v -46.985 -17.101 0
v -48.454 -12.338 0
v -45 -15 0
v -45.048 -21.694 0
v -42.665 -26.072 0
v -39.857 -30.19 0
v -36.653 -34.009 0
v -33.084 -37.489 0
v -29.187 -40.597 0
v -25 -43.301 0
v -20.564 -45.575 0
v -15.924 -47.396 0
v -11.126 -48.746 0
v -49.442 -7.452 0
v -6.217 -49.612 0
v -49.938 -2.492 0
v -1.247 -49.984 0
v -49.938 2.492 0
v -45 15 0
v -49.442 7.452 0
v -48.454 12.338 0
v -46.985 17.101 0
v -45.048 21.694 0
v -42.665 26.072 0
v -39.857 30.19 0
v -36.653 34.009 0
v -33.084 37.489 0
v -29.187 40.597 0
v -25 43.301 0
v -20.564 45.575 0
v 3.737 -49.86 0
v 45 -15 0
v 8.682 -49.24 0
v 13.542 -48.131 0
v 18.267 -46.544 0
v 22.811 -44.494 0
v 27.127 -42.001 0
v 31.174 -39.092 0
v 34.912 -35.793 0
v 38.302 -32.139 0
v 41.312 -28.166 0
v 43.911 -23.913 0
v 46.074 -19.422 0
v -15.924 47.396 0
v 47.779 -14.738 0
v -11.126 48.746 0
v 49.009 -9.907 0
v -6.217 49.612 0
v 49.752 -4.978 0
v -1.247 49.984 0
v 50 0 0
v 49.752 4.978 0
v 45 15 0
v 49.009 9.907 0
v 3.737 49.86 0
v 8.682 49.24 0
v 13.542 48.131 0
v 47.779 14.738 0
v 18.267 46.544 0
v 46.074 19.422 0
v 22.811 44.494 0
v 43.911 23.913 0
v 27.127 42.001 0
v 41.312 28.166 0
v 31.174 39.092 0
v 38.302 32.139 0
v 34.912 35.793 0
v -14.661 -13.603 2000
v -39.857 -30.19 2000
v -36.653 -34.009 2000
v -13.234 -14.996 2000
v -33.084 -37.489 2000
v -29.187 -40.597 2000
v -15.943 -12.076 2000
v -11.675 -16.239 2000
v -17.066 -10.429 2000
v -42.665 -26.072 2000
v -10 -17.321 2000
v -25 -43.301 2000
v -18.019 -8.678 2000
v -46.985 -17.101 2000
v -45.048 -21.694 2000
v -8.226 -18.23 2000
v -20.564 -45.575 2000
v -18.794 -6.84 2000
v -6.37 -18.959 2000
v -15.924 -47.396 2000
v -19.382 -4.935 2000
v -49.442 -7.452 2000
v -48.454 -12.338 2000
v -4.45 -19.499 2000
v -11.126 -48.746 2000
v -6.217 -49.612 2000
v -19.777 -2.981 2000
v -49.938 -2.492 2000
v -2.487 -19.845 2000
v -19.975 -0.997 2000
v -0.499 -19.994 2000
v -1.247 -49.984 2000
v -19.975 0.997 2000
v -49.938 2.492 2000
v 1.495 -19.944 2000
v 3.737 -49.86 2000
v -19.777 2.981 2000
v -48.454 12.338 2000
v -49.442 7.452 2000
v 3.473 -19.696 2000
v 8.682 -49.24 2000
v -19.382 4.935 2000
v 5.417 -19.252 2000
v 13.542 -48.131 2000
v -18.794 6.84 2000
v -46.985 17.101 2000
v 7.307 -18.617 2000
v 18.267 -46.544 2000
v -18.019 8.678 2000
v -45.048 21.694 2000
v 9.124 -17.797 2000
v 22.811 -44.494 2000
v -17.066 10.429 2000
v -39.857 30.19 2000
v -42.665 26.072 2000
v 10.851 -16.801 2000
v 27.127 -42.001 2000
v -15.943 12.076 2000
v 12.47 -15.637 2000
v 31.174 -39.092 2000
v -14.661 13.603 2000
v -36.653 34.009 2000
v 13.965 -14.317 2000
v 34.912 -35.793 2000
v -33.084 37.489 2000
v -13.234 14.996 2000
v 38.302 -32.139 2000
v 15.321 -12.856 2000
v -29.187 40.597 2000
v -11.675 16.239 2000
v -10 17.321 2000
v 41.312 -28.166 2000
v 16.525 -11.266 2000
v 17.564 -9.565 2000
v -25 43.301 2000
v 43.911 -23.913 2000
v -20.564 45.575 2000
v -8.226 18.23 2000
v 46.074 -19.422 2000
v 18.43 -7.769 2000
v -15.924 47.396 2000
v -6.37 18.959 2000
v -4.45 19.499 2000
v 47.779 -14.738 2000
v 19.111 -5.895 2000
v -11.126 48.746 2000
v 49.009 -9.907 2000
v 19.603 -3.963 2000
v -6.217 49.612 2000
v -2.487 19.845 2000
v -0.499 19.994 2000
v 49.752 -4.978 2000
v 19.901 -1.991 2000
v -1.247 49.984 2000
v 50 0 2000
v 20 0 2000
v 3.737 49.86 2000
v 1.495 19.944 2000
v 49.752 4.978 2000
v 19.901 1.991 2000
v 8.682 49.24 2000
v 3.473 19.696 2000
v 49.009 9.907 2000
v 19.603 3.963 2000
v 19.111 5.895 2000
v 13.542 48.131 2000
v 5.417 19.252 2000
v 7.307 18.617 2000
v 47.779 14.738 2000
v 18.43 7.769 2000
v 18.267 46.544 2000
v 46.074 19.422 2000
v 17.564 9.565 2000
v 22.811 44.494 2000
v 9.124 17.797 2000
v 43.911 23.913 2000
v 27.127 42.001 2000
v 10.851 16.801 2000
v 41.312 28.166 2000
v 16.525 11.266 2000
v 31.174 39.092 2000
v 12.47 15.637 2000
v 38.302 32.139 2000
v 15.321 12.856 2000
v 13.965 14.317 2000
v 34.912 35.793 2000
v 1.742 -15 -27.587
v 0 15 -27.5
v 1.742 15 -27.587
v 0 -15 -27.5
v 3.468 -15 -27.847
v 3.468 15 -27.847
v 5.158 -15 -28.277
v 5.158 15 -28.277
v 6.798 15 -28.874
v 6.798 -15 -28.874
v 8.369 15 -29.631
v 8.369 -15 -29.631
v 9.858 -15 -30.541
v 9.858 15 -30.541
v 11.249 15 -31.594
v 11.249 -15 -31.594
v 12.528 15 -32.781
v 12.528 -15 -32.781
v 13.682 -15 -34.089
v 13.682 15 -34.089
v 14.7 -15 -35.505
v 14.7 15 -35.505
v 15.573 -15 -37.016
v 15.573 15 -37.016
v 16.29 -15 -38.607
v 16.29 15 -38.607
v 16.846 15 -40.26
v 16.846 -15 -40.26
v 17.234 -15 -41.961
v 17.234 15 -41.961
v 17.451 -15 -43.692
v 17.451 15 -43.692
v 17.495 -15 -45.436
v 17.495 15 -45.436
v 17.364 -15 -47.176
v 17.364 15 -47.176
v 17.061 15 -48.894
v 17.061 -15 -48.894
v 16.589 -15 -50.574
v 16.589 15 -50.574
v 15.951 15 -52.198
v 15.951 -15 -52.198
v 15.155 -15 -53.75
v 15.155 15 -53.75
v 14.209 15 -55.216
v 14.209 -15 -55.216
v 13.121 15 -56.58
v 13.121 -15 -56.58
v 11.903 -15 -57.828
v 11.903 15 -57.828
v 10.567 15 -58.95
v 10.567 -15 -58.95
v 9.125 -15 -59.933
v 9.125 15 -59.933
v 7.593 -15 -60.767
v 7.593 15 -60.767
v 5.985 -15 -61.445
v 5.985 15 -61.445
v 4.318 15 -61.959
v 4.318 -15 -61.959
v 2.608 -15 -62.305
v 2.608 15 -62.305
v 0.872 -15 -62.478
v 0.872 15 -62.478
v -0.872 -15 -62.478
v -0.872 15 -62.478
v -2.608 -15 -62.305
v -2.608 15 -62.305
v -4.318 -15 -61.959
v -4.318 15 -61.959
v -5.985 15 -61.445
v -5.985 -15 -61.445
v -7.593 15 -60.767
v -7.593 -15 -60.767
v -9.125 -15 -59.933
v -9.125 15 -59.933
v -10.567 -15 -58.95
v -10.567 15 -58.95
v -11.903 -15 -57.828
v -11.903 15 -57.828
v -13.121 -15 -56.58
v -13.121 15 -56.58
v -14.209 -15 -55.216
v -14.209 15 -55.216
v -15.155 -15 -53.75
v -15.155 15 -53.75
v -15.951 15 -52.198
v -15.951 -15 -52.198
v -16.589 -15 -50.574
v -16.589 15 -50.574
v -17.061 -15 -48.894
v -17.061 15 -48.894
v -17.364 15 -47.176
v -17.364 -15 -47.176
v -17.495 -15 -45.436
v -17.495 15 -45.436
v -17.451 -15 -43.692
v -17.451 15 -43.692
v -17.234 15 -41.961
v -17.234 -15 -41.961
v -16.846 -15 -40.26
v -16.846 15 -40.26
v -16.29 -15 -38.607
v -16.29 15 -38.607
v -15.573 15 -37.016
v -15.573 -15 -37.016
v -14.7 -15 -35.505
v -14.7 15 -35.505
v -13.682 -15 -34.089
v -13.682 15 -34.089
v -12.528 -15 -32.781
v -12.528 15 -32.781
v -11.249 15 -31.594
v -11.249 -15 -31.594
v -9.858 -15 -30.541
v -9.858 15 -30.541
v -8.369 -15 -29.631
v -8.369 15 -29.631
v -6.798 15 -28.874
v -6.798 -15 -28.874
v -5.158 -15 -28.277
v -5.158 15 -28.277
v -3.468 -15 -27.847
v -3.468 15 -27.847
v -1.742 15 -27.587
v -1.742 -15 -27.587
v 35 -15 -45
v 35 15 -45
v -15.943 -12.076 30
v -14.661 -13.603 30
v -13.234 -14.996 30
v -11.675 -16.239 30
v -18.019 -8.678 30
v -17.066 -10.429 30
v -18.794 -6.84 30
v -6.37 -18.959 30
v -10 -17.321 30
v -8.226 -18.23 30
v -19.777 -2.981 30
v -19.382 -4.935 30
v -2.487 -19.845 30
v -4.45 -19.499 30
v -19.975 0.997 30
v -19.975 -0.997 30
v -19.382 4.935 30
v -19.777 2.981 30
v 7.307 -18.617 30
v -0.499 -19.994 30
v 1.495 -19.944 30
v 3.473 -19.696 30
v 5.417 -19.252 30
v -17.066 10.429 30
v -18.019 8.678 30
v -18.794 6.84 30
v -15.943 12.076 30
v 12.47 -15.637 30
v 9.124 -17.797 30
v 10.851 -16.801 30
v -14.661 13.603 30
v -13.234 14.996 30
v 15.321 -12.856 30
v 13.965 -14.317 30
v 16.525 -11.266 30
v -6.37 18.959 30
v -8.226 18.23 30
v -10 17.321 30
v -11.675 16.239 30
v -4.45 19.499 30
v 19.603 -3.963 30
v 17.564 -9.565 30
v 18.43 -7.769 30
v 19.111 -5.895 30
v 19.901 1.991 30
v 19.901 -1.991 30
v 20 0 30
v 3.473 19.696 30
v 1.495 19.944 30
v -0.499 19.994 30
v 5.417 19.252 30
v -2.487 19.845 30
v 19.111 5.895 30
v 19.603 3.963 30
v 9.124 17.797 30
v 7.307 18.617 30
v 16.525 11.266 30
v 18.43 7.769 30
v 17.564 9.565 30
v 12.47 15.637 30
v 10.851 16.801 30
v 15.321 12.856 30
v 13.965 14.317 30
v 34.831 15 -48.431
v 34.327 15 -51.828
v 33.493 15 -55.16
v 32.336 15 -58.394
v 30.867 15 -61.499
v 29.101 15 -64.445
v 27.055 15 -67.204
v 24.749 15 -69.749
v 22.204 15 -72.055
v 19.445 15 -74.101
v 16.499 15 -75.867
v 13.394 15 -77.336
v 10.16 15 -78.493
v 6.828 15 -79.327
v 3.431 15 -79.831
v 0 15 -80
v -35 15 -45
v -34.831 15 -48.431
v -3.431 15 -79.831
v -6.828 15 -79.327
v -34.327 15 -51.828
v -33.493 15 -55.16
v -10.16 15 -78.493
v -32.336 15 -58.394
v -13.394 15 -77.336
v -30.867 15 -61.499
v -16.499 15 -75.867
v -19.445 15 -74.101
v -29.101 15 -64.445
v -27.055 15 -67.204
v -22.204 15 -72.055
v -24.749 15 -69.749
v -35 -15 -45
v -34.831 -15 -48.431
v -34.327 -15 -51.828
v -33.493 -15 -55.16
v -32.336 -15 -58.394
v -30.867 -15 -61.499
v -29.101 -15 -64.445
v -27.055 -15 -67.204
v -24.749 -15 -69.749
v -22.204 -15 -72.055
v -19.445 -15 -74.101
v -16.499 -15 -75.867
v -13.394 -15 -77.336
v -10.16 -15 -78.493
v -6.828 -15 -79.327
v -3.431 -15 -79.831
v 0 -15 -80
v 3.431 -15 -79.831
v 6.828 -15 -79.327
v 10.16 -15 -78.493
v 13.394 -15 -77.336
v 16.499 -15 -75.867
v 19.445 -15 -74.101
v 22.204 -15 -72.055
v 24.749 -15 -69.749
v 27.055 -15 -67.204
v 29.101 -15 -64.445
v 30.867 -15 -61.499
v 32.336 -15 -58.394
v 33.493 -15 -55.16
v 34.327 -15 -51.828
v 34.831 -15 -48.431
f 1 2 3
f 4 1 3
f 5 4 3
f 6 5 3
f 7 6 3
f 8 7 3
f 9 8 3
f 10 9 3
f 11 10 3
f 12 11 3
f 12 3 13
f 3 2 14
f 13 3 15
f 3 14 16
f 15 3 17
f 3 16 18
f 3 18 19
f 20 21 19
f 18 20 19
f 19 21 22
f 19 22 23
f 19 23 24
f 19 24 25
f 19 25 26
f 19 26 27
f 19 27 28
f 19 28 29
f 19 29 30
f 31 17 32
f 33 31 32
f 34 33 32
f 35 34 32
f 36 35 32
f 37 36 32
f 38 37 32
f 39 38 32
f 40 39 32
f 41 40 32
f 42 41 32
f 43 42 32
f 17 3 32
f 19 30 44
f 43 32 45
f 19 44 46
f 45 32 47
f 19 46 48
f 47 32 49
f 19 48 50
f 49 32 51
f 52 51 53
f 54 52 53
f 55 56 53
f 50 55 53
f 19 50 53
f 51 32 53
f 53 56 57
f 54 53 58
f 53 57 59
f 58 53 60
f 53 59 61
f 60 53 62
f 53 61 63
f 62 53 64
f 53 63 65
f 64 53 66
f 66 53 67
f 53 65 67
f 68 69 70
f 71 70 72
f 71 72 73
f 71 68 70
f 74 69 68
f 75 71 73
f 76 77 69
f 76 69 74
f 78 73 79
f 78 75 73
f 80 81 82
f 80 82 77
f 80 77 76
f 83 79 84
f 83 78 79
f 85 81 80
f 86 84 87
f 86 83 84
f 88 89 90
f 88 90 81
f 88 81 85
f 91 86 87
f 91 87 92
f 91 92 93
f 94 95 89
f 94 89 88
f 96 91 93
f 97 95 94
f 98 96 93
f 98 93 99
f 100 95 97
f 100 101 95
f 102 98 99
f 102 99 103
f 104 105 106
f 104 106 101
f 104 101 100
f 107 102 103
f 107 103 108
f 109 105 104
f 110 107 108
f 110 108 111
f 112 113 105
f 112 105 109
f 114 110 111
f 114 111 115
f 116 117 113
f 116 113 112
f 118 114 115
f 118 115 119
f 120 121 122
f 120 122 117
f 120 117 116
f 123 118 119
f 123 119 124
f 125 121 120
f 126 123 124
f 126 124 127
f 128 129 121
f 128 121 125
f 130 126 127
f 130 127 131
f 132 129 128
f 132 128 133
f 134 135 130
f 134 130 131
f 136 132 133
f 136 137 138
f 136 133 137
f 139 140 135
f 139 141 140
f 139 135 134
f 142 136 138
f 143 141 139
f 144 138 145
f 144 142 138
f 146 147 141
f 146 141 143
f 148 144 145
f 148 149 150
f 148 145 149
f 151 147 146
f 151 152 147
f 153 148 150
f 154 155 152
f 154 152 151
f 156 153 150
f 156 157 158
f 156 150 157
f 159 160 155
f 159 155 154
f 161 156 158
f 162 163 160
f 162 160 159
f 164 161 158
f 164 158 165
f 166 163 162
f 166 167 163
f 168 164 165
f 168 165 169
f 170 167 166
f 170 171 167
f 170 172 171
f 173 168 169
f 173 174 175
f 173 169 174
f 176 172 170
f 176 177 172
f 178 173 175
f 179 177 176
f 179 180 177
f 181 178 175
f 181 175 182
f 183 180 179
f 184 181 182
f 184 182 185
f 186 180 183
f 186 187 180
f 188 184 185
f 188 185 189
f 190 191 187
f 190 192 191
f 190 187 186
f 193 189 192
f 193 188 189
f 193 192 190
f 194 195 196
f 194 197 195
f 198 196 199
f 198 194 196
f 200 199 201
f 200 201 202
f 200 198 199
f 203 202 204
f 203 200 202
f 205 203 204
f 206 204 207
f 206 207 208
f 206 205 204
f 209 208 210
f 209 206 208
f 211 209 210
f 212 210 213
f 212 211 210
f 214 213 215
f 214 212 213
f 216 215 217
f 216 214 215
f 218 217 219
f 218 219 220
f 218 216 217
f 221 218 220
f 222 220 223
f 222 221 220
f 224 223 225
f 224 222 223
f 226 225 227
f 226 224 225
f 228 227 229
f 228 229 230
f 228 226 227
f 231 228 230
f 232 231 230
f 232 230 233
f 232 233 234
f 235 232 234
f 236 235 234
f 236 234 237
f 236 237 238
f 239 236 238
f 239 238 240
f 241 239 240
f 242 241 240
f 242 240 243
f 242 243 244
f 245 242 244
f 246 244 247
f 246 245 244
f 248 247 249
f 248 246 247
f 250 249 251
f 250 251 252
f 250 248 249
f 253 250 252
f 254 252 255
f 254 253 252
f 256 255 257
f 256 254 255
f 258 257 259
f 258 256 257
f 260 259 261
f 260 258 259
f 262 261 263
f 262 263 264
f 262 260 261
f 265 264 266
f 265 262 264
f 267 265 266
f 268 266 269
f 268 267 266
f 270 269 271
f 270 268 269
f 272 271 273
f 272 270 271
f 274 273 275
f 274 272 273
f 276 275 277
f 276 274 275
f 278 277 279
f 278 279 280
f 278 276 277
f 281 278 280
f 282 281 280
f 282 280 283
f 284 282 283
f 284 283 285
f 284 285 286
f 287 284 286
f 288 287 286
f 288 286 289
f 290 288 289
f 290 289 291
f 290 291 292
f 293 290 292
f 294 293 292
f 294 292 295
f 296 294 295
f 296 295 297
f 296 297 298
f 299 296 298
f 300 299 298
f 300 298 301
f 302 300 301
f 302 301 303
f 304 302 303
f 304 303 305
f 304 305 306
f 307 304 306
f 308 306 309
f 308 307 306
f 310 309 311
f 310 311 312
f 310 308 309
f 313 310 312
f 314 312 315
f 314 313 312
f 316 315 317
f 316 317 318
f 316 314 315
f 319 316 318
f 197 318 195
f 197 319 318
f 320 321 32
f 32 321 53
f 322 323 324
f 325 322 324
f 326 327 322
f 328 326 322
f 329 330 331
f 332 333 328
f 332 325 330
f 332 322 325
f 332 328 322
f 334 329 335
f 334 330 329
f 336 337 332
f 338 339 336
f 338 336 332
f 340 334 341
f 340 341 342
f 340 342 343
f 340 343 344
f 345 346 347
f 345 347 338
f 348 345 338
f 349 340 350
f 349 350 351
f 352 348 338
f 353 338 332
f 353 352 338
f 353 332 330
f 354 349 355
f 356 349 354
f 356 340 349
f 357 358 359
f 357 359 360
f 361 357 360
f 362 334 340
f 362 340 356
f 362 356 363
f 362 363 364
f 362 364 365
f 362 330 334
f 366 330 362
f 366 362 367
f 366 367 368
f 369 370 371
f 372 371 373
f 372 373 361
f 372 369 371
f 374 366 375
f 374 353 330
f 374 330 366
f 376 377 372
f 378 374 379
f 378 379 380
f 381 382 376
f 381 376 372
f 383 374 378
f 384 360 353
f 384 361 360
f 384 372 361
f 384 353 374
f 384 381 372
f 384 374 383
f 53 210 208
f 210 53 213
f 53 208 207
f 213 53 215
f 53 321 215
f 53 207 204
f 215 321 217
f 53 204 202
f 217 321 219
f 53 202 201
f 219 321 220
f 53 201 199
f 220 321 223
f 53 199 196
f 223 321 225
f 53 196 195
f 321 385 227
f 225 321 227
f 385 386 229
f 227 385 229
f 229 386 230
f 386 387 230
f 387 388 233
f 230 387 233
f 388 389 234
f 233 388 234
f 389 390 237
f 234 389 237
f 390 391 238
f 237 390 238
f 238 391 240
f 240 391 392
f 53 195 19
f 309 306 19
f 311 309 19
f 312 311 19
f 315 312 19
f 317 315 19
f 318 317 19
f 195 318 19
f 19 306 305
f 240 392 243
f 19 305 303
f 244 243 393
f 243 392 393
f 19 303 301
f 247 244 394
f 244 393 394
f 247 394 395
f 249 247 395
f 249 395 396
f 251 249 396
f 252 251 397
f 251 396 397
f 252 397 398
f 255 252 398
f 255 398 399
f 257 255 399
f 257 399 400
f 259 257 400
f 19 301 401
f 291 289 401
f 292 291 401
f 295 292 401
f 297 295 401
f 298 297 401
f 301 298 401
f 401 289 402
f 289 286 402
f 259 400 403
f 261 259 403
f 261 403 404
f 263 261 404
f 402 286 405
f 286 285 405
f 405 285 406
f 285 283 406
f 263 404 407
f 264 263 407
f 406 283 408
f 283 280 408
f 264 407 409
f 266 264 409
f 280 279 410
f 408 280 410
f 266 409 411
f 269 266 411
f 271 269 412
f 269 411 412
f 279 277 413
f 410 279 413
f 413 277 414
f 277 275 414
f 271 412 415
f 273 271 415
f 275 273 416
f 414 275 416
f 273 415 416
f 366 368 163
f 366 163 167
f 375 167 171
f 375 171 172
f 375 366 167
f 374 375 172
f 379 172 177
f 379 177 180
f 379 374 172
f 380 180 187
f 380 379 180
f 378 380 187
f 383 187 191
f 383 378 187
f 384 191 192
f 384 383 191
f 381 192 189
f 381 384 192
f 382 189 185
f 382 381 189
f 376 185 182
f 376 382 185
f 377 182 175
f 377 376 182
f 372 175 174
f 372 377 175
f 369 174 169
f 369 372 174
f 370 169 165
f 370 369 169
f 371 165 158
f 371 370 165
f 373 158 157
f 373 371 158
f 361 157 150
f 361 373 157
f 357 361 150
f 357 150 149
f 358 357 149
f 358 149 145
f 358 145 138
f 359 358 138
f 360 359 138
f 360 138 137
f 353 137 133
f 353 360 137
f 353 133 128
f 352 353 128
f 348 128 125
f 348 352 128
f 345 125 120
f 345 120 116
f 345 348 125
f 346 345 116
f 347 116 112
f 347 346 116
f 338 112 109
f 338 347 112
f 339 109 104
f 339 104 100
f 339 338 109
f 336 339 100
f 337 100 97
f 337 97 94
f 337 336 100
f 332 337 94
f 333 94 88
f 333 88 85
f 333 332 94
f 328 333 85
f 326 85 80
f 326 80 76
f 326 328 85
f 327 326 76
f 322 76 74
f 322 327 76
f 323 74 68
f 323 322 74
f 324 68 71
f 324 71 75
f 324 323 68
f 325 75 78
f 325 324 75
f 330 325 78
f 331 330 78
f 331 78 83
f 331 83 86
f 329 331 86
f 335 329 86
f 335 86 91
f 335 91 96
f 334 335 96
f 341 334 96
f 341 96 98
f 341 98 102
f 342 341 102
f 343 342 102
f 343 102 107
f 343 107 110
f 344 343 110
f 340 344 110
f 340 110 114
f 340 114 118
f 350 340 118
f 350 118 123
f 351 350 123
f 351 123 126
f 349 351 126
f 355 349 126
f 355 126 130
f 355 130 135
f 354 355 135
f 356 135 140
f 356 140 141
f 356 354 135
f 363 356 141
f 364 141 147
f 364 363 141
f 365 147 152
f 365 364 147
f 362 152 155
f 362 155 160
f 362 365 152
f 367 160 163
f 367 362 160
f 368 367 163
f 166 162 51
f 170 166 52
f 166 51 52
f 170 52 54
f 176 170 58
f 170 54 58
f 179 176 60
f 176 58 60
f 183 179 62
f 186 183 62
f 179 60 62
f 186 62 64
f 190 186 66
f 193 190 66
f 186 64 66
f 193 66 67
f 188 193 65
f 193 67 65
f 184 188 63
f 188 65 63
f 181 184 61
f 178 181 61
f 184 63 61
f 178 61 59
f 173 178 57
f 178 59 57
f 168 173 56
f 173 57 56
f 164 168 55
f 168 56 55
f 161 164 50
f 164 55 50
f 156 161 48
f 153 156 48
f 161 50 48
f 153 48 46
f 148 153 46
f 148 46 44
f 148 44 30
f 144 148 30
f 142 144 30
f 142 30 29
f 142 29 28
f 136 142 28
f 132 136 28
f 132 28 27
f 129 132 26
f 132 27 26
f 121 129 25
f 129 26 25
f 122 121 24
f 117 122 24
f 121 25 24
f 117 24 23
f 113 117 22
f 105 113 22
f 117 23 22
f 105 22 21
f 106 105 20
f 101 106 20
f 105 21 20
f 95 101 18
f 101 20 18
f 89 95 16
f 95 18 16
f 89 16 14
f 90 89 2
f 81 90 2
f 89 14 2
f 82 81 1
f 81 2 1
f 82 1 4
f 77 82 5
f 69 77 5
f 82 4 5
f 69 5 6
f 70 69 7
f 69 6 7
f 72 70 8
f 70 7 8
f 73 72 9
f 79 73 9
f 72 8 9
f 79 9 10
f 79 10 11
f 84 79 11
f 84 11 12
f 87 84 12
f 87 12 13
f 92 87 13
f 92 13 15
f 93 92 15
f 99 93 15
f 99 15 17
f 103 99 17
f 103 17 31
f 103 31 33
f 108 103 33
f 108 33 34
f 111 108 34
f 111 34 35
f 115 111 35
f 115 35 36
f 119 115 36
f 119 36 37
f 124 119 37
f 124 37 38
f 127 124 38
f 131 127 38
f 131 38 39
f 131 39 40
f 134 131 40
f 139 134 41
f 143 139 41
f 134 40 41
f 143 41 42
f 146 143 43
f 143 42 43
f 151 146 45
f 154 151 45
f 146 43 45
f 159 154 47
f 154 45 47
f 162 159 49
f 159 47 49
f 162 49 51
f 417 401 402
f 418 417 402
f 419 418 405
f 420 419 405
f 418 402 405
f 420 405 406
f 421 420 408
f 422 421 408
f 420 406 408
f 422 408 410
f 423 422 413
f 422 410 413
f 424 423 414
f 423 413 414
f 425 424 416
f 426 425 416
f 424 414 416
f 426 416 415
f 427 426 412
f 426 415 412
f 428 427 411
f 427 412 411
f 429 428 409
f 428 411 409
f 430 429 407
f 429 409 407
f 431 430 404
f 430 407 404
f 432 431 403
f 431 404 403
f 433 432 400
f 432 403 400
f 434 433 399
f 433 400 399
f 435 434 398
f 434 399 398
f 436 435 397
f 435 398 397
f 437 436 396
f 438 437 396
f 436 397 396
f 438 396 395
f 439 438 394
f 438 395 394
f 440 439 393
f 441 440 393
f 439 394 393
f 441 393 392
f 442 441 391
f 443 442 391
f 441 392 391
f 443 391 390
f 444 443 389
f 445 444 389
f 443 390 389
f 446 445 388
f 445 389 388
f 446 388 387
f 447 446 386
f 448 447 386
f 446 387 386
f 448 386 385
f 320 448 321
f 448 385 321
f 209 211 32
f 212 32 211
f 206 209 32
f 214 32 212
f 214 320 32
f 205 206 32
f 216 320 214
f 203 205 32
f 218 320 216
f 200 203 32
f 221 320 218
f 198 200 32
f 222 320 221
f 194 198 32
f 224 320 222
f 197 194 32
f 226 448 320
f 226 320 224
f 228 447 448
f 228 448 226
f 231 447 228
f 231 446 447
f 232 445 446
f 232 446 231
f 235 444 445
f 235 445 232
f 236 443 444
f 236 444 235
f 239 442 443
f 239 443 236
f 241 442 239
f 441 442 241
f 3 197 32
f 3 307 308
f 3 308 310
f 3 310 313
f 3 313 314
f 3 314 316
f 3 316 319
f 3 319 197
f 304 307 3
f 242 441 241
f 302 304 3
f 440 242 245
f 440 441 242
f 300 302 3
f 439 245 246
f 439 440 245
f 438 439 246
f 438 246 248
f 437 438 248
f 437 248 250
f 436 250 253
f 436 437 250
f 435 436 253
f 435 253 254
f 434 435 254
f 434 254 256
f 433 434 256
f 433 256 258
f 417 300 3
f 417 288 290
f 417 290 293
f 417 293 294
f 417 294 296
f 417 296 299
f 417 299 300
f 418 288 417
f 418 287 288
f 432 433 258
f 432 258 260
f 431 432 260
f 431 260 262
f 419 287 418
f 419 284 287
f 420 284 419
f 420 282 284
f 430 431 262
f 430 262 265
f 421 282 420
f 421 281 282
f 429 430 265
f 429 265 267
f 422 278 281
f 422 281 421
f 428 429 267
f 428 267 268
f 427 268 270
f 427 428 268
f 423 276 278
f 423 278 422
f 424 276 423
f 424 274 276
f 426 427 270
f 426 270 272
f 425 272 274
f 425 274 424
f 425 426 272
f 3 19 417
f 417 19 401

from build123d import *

# Parameters (mm, degrees)
SKETCH1_R           = 50
BOSS_EXTRUDE1_DEPTH = 2000
SKETCH3_R           = 17.5
BOSS_EXTRUDE2_DEPTH = 15
SHELL1_START        = 30
SHELL1_OUTLINE_R    = 20
SHELL1_DEPTH        = 1970


# Read off the part's stored shape, not the designer's step: Shell1
with BuildPart() as part:
    # Sketch1 → Boss-Extrude1 (new body)
    with BuildSketch(Plane.XY):
        Circle(SKETCH1_R)
    extrude(amount=BOSS_EXTRUDE1_DEPTH)

    # Sketch3 → Boss-Extrude2 (add, symmetric)
    with BuildSketch(Plane(origin=(0, 0, 0), x_dir=(1, 0, 0), z_dir=(0, 1, 0))):
        with BuildLine():
            ThreePointArc((-35, 45), (0, 80), (35, 45))
            Line((35, 45), (45, 0))
            Line((45, 0), (-45, 0))
            Line((-45, 0), (-35, 45))
        make_face()
        with Locations(Location((0, 45, 0), (0, 0, 270))):
            Circle(SKETCH3_R, mode=Mode.SUBTRACT)
    extrude(amount=BOSS_EXTRUDE2_DEPTH, both=True)

    # Shell1 outline → Shell1 (cut)
    with BuildSketch(Plane.XY.offset(SHELL1_START)):
        Circle(SHELL1_OUTLINE_R)
    extrude(amount=SHELL1_DEPTH, mode=Mode.SUBTRACT)


solid = part.part
